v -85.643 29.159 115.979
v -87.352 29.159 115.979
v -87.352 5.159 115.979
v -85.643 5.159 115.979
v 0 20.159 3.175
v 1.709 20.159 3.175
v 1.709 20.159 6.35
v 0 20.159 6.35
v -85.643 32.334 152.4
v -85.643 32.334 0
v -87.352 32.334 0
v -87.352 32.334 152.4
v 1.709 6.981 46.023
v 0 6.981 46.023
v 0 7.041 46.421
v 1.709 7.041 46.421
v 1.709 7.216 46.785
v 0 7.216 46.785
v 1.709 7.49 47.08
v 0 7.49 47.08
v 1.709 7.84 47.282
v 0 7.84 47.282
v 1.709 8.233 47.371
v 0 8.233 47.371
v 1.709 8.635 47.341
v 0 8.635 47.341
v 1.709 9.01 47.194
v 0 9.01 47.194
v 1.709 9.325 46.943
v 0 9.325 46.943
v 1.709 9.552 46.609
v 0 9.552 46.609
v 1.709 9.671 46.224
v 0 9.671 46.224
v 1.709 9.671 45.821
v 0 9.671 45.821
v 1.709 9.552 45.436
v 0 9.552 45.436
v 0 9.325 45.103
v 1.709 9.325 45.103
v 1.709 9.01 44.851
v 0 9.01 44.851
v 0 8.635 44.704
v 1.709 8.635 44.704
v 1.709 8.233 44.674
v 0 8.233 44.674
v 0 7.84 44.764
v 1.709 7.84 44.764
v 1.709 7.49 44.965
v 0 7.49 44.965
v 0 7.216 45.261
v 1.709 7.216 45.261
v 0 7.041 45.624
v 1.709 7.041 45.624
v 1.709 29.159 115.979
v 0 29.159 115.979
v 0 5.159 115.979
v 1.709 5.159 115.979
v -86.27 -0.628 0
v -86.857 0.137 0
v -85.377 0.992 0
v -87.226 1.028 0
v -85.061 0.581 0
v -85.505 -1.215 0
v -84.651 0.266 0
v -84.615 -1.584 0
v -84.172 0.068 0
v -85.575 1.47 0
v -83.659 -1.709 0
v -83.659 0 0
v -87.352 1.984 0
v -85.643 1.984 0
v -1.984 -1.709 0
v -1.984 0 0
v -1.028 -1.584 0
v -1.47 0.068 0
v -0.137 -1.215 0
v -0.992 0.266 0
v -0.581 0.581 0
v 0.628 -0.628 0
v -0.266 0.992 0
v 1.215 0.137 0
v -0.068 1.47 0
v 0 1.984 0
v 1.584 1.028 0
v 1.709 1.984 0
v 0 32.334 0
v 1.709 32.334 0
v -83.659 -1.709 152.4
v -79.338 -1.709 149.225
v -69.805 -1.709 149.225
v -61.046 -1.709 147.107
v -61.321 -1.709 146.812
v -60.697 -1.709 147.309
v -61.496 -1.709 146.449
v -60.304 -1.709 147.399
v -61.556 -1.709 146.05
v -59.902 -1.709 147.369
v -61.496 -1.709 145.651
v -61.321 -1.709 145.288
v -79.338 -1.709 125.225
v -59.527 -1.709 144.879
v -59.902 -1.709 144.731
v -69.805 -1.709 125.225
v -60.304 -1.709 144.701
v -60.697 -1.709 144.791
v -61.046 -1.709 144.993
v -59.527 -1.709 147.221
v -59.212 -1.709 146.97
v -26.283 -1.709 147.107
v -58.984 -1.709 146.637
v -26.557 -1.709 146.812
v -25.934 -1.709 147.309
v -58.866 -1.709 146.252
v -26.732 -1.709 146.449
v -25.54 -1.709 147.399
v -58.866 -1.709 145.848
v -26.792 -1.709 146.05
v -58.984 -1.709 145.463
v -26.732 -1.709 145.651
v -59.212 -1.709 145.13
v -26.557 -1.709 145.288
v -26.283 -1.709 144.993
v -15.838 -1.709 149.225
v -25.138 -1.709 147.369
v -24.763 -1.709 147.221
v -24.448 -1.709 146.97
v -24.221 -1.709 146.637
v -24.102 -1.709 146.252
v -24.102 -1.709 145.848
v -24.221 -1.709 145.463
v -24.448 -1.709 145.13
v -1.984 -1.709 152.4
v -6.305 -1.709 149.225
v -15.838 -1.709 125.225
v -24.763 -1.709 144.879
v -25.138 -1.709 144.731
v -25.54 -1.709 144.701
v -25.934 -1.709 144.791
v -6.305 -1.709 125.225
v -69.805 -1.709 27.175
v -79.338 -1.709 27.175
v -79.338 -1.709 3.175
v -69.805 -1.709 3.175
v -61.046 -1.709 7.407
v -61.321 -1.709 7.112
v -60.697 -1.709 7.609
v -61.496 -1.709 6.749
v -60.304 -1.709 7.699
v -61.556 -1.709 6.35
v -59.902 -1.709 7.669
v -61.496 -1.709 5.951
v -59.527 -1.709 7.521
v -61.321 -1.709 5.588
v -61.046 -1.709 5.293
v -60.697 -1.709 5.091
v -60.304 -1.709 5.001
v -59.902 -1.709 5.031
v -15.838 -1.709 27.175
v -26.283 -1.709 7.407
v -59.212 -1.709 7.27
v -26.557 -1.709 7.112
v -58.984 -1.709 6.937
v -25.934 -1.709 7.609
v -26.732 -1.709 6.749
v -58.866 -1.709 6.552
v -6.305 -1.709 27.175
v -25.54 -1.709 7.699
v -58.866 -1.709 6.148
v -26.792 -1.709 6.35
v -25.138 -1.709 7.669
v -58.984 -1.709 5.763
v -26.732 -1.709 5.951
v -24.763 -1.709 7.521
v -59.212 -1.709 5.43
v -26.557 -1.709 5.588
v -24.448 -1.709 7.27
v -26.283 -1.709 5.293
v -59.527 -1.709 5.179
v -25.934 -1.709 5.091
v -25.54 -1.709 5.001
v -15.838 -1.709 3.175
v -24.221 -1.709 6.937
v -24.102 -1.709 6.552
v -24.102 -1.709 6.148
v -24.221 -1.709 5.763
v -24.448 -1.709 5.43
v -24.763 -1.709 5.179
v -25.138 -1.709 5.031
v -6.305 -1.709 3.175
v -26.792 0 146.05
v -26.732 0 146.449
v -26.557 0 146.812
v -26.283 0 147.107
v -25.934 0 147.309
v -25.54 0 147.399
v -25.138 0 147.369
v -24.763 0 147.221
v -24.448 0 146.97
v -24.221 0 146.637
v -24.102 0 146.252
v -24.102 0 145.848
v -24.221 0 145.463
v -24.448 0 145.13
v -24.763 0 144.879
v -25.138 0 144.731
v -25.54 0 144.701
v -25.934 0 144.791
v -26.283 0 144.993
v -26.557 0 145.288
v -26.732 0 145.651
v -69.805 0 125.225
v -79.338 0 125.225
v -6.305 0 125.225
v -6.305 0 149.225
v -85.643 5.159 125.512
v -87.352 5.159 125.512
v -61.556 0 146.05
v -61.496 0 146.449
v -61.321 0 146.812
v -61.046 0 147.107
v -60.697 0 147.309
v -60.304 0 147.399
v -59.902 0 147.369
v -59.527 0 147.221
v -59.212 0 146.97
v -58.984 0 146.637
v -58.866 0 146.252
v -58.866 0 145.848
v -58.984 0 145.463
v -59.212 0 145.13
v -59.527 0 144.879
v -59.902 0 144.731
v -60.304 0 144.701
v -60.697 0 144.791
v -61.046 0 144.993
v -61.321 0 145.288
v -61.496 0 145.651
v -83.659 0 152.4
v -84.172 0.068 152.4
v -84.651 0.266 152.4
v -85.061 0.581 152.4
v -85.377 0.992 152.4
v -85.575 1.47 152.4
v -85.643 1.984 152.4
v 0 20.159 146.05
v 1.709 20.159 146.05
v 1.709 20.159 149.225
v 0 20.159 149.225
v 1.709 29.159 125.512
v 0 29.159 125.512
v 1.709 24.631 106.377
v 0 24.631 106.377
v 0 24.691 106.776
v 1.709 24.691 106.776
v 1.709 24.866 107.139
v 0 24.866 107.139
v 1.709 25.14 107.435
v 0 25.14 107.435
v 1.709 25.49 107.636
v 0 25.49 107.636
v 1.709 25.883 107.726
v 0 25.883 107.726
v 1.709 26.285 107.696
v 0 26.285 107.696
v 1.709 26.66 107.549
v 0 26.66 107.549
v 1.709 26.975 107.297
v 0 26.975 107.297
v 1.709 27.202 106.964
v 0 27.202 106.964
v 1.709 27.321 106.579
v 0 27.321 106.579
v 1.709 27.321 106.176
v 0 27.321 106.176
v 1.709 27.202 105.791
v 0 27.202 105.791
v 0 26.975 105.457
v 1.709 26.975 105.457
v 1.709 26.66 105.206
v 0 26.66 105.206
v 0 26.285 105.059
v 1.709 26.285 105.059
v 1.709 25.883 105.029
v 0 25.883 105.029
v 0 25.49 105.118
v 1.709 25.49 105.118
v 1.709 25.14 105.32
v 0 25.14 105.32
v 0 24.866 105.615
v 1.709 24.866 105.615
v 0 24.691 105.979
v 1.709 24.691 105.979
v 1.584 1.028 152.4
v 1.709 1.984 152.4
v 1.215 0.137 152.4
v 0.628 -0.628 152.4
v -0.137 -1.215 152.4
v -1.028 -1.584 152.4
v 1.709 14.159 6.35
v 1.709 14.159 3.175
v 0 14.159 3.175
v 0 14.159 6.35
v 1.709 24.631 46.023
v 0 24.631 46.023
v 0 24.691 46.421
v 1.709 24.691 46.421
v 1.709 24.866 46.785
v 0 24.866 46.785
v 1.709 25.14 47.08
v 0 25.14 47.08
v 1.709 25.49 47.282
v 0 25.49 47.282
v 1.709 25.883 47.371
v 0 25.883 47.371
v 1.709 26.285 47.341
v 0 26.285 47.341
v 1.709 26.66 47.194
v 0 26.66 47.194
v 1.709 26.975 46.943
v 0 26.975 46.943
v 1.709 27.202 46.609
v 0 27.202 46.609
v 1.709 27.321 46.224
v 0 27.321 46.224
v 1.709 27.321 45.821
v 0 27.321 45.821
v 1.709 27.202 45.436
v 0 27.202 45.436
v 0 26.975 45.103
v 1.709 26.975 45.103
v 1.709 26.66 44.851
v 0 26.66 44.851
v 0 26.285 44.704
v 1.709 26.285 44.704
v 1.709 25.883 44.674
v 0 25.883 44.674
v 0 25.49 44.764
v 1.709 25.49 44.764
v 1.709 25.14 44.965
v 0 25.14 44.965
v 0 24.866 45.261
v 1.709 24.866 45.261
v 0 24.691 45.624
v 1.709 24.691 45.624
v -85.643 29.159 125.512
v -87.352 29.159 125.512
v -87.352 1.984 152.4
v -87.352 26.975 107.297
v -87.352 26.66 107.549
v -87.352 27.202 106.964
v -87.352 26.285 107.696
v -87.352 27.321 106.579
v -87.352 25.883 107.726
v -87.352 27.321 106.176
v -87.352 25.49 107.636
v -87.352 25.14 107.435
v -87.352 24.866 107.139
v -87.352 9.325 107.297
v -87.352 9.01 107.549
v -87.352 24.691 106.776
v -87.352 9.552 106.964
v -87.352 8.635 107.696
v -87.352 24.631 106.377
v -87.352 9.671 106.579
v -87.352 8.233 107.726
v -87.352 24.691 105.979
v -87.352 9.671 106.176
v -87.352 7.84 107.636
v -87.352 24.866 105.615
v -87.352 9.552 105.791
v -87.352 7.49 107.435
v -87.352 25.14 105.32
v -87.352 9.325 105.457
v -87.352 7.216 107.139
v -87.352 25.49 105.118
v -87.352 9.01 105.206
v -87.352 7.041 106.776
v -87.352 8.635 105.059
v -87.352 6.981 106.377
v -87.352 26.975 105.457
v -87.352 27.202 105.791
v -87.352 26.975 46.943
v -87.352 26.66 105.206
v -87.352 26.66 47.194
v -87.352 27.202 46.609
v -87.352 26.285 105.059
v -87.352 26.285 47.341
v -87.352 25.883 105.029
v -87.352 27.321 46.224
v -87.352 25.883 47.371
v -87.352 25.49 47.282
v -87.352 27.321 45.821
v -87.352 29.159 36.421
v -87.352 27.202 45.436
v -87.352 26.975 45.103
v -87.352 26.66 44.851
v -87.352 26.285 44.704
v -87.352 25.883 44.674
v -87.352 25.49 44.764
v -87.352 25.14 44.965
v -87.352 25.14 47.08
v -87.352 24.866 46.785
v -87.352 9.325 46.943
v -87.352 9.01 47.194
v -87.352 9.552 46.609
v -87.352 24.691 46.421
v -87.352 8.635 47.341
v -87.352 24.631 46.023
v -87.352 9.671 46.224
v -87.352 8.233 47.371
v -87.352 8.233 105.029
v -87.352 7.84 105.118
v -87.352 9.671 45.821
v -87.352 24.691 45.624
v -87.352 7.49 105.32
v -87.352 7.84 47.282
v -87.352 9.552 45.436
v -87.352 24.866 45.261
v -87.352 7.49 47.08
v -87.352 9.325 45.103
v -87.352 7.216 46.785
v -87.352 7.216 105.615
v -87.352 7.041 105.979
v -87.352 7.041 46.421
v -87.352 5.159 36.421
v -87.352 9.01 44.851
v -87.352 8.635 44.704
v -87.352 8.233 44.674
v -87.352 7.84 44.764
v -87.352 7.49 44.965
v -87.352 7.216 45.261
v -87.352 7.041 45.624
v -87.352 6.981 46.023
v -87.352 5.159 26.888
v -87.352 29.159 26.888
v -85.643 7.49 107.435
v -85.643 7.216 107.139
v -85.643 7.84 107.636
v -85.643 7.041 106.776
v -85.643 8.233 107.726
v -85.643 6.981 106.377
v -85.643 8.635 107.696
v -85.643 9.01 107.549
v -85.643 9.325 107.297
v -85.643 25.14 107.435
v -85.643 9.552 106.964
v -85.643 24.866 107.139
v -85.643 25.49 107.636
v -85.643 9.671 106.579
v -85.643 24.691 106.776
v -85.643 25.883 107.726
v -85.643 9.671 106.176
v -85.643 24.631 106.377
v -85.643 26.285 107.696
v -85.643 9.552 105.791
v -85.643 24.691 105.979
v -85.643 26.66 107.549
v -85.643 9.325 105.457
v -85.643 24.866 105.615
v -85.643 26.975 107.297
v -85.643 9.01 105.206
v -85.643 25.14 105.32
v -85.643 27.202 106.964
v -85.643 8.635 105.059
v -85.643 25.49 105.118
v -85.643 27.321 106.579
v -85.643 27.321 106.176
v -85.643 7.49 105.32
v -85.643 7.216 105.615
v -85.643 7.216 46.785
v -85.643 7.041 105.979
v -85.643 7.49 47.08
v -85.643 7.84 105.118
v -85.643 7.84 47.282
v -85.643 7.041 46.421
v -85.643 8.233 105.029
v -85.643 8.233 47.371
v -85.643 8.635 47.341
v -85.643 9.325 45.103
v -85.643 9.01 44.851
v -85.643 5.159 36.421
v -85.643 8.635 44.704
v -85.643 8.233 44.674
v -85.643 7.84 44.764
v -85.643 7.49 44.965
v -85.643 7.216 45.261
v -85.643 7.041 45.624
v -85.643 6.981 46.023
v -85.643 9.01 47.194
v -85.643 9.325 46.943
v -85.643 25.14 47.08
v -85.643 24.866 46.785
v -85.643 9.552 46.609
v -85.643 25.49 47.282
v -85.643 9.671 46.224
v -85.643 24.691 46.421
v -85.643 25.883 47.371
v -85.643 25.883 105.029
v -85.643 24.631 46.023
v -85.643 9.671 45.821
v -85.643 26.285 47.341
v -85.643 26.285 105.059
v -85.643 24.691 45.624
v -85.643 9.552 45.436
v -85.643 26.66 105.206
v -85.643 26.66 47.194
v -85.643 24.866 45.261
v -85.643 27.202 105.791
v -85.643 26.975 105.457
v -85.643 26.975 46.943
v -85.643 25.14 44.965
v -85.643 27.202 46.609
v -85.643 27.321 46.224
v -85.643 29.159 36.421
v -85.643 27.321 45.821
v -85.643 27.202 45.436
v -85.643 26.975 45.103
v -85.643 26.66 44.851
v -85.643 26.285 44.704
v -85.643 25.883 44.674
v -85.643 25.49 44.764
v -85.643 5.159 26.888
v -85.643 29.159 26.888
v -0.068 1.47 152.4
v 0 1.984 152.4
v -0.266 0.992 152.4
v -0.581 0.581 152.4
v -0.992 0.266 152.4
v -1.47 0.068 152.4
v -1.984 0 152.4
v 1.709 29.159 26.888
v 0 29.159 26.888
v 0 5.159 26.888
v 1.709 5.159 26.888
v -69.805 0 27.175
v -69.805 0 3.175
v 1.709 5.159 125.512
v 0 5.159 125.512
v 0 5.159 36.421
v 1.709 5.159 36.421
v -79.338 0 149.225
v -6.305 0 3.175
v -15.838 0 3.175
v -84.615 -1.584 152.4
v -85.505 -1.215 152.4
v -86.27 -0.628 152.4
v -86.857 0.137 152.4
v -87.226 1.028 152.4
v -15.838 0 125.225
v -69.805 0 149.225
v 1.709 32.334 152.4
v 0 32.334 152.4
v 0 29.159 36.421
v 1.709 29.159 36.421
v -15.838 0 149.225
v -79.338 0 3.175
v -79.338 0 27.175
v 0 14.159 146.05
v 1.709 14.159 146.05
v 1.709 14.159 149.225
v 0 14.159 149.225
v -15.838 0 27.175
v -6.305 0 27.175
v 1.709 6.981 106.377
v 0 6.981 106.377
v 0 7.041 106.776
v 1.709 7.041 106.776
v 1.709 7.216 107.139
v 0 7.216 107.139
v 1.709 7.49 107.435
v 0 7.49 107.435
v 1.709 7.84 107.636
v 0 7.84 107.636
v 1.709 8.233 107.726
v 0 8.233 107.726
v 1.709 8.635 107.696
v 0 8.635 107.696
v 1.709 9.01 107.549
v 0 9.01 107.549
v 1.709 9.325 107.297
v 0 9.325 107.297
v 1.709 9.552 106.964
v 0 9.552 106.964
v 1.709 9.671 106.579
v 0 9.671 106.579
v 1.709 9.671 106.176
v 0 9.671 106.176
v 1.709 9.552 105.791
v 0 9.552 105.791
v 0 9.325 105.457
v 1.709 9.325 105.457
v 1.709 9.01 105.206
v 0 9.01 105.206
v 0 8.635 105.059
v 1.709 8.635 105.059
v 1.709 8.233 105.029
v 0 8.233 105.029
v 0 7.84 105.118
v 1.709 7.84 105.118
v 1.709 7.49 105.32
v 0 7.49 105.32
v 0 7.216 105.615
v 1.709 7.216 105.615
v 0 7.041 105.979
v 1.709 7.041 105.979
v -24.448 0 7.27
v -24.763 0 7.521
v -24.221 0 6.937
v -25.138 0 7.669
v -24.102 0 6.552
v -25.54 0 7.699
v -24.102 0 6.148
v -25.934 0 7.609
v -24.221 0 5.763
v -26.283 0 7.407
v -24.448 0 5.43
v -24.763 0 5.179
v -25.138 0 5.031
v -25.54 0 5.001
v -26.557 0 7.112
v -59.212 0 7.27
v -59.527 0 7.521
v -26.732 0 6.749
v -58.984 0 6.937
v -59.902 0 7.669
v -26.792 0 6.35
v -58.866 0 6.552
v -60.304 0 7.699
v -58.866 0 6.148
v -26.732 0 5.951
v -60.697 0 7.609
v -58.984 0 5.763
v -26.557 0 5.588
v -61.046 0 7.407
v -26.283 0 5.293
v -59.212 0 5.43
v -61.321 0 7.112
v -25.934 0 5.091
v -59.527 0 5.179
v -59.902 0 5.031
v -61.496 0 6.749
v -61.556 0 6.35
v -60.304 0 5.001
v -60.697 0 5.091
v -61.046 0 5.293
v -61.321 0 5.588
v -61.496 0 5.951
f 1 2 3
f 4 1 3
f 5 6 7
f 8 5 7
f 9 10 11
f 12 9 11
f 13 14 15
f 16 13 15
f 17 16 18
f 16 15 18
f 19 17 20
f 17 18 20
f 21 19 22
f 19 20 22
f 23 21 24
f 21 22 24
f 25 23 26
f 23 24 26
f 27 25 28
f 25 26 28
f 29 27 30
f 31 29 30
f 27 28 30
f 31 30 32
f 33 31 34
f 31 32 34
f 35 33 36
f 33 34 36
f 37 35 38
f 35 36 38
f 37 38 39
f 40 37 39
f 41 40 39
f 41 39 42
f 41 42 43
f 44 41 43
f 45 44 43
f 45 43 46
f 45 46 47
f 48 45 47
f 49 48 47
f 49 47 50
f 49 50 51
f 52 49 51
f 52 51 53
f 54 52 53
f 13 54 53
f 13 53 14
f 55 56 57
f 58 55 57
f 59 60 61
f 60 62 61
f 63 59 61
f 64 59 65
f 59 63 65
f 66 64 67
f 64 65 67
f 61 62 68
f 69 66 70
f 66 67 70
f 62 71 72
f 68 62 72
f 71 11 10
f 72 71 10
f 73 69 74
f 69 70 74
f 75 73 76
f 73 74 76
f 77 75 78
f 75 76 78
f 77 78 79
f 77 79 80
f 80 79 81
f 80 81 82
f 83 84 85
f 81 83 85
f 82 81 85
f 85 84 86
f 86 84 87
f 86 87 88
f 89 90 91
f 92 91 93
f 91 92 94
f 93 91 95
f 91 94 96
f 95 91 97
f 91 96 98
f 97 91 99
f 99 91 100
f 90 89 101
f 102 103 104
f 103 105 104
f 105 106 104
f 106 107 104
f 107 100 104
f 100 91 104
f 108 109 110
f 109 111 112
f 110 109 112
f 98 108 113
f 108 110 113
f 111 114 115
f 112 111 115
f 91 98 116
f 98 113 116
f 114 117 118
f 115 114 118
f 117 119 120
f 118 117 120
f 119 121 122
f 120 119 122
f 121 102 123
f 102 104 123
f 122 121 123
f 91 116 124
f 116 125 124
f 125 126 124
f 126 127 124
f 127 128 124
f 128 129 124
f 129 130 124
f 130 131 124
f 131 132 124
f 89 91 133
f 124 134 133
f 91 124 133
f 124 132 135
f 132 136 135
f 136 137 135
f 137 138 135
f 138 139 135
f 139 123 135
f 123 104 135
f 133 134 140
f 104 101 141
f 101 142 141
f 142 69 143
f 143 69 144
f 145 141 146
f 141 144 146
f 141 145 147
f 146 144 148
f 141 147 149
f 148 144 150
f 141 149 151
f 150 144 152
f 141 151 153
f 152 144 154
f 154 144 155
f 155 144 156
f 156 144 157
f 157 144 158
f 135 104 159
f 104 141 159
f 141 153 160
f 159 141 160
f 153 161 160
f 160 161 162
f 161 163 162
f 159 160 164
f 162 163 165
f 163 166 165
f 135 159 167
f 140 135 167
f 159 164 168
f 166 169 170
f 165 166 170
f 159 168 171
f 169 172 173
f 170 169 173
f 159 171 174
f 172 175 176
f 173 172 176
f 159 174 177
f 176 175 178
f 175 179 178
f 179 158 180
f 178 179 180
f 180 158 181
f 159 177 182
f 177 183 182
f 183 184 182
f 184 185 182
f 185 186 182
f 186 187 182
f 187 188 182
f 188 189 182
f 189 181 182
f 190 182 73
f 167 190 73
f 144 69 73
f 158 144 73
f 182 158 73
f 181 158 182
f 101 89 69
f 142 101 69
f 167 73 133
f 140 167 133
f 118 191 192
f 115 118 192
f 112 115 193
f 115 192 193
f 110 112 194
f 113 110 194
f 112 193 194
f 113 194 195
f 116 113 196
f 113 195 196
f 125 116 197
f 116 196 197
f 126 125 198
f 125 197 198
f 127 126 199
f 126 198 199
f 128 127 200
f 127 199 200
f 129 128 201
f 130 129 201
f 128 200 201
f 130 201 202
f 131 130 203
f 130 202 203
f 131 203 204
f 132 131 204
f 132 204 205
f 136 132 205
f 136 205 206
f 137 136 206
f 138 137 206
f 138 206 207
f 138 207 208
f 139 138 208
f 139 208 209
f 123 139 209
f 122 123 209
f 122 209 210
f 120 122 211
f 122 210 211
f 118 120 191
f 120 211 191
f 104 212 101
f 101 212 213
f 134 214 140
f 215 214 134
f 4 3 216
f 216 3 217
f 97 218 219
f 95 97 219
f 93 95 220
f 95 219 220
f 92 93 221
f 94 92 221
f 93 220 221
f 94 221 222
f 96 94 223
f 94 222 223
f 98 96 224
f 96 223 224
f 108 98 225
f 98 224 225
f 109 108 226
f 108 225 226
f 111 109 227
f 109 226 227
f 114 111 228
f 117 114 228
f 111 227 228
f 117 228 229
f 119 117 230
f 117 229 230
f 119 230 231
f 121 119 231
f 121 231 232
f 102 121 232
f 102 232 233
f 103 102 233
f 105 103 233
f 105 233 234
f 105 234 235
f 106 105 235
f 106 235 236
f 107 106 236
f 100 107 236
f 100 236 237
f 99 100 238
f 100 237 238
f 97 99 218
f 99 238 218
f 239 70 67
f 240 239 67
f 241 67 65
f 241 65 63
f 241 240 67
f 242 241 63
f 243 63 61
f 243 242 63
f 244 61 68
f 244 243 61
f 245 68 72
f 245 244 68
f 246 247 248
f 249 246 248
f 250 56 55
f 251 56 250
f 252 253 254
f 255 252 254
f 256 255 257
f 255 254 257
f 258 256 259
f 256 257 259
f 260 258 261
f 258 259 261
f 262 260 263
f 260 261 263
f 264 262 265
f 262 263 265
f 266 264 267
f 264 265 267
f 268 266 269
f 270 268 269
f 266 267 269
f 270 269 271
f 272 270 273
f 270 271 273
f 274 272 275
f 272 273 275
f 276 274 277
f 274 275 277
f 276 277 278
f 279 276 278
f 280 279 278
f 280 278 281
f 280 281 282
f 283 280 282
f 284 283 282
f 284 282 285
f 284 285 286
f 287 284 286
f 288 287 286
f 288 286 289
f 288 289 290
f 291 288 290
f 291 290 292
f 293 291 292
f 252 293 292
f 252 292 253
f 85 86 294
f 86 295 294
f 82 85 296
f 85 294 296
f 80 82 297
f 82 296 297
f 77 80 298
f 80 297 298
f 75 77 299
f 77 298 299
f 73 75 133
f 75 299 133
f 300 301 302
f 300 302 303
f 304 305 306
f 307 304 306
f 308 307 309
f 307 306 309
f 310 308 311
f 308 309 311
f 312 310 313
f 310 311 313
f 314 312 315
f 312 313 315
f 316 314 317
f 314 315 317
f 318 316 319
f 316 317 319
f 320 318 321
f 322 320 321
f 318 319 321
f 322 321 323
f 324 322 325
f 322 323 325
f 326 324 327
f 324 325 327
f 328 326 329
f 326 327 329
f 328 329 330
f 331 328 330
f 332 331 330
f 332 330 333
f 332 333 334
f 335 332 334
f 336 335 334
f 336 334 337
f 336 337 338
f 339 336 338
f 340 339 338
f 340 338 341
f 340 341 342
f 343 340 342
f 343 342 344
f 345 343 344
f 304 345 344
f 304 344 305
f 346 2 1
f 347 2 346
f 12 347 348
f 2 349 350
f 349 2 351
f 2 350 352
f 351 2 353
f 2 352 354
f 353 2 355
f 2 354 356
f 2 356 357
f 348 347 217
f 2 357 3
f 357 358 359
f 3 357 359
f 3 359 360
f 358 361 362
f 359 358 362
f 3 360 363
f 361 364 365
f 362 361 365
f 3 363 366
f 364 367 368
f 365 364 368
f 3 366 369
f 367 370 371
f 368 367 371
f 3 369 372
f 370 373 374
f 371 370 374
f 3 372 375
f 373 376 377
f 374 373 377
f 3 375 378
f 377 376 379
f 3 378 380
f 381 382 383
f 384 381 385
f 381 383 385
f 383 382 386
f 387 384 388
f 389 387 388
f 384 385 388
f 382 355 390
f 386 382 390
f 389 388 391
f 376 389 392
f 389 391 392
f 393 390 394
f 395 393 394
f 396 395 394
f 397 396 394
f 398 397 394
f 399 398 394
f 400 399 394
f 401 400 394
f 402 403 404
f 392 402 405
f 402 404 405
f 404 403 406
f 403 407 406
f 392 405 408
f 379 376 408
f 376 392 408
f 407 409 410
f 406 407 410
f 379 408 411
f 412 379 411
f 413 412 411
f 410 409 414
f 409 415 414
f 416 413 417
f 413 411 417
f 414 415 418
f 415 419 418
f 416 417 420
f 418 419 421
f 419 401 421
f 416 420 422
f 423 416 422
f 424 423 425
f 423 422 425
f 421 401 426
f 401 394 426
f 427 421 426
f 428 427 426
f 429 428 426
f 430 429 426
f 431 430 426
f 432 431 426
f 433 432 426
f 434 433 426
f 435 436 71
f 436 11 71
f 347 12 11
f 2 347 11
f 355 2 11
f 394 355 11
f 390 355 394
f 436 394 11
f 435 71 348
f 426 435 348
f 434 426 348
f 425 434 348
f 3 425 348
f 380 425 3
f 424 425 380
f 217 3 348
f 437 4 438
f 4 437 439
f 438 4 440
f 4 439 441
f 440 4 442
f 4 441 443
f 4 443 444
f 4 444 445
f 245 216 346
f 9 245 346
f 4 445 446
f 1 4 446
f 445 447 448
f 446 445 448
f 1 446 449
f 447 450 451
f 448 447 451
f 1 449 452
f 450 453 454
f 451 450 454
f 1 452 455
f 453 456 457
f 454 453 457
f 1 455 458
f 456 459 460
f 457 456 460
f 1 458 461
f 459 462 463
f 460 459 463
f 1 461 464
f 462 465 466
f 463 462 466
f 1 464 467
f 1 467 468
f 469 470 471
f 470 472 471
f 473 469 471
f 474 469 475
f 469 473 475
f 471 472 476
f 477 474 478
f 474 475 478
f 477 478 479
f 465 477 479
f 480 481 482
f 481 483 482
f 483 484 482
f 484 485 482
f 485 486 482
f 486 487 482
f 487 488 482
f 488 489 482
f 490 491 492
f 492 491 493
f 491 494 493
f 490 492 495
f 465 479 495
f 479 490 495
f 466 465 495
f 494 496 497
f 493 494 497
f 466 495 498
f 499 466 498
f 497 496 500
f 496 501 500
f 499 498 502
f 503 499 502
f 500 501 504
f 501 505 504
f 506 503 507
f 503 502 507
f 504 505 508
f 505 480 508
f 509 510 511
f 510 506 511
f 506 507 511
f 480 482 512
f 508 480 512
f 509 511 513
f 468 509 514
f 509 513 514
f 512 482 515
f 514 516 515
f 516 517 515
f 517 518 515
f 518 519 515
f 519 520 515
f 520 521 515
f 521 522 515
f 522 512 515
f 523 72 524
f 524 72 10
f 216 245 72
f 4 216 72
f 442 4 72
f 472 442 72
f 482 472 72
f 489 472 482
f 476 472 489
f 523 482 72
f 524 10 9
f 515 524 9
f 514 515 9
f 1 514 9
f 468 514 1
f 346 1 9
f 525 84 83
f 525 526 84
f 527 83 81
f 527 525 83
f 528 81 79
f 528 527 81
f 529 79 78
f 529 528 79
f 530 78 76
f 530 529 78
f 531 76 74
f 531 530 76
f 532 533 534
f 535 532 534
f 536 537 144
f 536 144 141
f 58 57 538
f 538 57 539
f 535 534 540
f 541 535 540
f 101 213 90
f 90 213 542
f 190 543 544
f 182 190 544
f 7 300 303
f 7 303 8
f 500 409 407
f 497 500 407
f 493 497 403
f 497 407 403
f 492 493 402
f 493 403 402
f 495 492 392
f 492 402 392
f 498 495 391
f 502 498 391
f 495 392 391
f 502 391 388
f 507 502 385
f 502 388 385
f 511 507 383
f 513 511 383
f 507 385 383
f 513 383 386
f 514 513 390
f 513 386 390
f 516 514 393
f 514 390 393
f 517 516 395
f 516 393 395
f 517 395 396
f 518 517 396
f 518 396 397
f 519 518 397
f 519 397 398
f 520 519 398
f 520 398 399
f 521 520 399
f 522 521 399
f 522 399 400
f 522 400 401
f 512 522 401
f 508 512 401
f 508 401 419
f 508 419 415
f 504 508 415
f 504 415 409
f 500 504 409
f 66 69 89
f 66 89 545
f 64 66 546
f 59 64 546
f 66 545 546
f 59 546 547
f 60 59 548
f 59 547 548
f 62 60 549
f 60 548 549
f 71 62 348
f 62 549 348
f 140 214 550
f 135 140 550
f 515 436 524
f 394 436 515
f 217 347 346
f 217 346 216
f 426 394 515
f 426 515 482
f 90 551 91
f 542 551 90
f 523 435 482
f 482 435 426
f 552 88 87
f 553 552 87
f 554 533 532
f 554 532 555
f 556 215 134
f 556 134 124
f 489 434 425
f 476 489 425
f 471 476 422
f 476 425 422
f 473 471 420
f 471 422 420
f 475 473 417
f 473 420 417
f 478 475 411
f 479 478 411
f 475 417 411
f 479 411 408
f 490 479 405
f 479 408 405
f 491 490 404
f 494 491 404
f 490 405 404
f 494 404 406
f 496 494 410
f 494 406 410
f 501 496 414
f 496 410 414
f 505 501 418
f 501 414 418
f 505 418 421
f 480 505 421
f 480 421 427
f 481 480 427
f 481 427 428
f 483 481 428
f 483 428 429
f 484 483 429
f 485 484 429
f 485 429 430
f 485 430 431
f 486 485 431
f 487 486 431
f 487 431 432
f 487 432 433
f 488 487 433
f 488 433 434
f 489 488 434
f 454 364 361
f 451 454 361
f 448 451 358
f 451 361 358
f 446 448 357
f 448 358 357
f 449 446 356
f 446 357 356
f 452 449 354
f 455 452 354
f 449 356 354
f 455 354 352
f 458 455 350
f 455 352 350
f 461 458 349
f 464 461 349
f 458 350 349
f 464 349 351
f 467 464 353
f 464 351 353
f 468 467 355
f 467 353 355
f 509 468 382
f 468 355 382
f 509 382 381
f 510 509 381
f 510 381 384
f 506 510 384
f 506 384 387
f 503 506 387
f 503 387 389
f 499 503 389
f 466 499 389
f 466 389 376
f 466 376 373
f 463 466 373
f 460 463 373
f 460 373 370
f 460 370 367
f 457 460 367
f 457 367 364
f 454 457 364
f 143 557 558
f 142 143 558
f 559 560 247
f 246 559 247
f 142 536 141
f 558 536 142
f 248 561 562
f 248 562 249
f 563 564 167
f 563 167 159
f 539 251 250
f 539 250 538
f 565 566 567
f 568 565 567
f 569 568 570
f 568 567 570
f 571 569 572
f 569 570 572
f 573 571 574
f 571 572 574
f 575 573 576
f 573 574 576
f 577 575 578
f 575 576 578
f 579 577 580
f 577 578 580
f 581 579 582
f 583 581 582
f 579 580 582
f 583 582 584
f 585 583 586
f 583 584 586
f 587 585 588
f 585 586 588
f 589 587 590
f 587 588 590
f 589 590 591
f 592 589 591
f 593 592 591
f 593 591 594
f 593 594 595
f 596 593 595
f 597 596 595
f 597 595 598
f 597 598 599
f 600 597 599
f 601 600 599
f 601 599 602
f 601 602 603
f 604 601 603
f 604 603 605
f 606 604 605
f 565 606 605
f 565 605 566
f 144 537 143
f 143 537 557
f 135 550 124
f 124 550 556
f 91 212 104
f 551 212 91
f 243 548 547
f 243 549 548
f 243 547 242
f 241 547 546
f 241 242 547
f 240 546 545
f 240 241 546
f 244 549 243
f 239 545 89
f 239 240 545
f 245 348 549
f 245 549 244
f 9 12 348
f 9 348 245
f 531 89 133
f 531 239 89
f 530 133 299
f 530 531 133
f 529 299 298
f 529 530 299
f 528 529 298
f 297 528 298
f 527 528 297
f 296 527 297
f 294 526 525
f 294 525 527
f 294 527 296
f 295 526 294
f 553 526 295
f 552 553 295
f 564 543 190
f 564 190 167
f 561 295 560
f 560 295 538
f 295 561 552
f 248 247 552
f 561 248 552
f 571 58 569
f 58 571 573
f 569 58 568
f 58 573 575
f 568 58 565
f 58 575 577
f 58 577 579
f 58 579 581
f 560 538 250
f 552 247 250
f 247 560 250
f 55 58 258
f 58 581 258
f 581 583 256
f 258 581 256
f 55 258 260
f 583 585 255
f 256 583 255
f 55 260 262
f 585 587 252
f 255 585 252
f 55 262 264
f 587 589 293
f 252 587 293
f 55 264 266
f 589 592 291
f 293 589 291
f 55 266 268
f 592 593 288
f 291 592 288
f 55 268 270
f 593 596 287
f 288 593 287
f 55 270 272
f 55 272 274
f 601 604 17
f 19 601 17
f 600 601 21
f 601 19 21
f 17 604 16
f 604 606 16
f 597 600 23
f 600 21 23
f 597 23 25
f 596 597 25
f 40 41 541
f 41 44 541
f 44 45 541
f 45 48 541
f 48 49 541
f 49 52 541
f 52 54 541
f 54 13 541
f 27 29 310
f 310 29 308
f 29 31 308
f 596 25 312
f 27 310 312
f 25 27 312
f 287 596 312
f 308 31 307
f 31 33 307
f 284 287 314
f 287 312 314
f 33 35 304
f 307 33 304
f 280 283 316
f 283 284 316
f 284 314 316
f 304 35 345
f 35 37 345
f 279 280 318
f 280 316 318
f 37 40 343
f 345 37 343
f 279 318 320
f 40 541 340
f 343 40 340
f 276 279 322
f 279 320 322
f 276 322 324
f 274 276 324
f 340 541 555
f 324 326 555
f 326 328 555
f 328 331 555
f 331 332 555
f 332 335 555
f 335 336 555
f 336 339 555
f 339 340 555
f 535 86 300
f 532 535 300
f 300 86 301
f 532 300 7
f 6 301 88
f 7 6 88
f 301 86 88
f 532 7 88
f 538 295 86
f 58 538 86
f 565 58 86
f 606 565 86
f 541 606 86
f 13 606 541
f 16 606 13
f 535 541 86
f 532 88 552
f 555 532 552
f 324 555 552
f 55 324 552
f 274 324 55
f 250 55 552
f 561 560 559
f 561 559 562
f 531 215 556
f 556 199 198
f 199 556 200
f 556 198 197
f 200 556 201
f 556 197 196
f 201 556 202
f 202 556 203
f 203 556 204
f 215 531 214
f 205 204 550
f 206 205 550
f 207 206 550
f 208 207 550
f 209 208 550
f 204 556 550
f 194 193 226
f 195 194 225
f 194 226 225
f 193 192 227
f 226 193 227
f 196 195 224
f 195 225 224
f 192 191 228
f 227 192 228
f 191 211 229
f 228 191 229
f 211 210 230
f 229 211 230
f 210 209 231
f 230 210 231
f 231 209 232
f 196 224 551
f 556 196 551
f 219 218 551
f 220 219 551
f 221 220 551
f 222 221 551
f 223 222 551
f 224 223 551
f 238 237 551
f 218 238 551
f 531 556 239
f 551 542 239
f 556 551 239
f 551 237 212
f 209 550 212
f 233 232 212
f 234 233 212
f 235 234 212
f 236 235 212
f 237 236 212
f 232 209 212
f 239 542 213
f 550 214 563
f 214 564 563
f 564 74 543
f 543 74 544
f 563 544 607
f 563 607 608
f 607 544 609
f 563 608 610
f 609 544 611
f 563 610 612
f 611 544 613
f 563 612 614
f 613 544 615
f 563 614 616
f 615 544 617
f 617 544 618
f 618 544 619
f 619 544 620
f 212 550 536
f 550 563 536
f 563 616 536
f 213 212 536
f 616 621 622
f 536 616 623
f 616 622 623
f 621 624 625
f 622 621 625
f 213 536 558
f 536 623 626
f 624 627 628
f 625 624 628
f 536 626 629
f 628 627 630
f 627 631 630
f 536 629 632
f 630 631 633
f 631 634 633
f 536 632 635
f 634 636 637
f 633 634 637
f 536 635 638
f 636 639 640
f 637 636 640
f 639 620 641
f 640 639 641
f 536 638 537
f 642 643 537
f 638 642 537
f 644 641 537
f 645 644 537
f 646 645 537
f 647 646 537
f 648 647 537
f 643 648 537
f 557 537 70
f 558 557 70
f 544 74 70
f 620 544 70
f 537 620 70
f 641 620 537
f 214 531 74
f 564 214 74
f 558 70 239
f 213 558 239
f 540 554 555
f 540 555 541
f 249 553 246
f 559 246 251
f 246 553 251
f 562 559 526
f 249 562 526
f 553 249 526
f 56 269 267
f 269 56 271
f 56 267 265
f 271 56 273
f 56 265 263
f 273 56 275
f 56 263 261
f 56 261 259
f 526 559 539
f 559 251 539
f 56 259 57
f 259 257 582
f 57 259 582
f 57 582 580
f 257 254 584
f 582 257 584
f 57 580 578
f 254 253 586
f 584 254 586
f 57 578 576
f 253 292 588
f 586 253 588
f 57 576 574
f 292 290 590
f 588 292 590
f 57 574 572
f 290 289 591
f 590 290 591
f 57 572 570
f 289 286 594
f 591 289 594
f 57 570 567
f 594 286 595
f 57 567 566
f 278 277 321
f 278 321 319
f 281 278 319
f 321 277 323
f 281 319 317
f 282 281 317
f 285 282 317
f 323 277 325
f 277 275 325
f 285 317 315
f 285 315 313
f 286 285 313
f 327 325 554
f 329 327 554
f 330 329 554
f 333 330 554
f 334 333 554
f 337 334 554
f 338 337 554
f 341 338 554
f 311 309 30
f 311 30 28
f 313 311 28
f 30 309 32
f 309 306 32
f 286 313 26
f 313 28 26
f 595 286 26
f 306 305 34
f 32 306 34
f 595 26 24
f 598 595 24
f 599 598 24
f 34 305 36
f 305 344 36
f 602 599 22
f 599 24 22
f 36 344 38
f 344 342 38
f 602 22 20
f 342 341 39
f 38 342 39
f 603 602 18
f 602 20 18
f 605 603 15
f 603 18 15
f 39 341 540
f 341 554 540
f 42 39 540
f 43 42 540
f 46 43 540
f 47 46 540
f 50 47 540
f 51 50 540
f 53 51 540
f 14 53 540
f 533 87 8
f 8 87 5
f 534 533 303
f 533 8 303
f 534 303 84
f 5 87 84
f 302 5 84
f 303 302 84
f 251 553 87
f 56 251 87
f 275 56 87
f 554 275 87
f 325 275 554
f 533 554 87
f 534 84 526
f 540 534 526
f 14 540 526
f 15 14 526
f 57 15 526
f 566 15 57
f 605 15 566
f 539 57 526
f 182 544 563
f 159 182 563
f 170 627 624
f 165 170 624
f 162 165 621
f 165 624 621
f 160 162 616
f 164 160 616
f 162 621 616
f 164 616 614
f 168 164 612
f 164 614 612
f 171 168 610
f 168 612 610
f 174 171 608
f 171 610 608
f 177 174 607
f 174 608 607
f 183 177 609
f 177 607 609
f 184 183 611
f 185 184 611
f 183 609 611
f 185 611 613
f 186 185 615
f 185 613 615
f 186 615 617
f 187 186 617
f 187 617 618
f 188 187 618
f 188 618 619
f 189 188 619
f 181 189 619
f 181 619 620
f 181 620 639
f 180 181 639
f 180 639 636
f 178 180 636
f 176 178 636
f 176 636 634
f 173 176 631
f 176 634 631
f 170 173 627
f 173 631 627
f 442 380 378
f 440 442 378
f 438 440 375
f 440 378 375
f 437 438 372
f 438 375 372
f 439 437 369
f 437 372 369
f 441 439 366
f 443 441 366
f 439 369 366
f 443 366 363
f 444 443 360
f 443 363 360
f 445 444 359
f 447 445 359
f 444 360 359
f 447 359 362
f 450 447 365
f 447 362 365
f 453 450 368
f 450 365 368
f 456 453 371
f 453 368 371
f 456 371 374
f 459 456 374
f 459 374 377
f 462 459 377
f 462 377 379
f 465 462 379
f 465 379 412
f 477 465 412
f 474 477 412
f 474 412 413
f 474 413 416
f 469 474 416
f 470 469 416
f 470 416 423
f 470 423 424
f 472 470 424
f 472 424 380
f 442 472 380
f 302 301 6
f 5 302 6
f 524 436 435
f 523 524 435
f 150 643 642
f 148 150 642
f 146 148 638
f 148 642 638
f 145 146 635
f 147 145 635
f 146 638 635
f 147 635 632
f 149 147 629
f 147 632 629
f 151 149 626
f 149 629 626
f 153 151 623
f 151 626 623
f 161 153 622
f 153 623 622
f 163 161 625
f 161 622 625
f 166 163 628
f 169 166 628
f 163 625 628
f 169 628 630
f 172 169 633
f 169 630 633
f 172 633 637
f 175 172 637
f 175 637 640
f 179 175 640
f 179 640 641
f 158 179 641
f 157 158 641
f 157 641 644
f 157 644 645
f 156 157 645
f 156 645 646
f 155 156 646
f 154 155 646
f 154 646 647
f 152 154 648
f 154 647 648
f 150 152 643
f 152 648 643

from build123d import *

# Parameters (mm, degrees)
F1_DEPTH = 152.4
F2_R     = 1.98374
F3_R     = 3.69316
F4_W     = 9.5329248
F4_H     = 24
F4_R     = 1.35255
F5_DEPTH = 1.70942
F6_W     = 24
F6_H     = 9.5329248
F6_R     = 1.35255
F7_DEPTH = 89.0613408
F8_W     = 6
F8_H     = 3.175
F9_DEPTH = 1.70942


with BuildPart() as f1:
    # F0 (on Top) → F1 (new body)
    with BuildSketch(Plane.XY):
        Polygon((0, 32.3337428), (0, 0), (-85.6425008, 0), (-85.6425008, 32.3337428), (-87.3519208, 32.3337428), (-87.3519208, -1.70942), (1.70942, -1.70942), (1.70942, 32.3337428), align=None)
    extrude(amount=F1_DEPTH)

    # F2
    f2_edges = [f1.edges().sort_by_distance(p)[0] for p in [
        (0, 0, 76.2),
        (-85.642501, 0, 76.2),
    ]]
    fillet(f2_edges, radius=F2_R)

    # F3
    f3_edges = [f1.edges().sort_by_distance(p)[0] for p in [
        (1.70942, -1.70942, 76.2),
        (-87.351921, -1.70942, 76.2),
    ]]
    fillet(f3_edges, radius=F3_R)

    # F4 (on face) → F5 (cut, through all)
    with BuildSketch(Plane(origin=(0, 0, 0), x_dir=(-1, 0, 0), z_dir=(0, 1, 0))):
        with Locations((74.5712504, 15.175)):
            Rectangle(F4_W, F4_H)
        with Locations((11.0712504, 15.175)):
            Rectangle(F4_W, F4_H)
        with Locations((11.0712504, 137.225)):
            Rectangle(F4_W, F4_H)
        with Locations((74.5712504, 137.225)):
            Rectangle(F4_W, F4_H)
        with Locations((60.20308, 6.35)):
            Circle(F4_R)
        with Locations((25.4394208, 6.35)):
            Circle(F4_R)
        with Locations((25.4394208, 146.05)):
            Circle(F4_R)
        with Locations((60.20308, 146.05)):
            Circle(F4_R)
    extrude(amount=-F5_DEPTH, mode=Mode.SUBTRACT)

    # F6 (on face) → F7 (cut, through all)
    with BuildSketch(Plane(origin=(-87.3519208, 0, 0), x_dir=(0, -1, 0), z_dir=(-1, 0, 0))):
        with Locations((-17.15874, 31.6544706)):
            Rectangle(F6_W, F6_H)
        with Locations((-17.15874, 120.7455294)):
            Rectangle(F6_W, F6_H)
        with Locations((-25.98374, 46.022641)):
            Circle(F6_R)
        with Locations((-25.98374, 106.377359)):
            Circle(F6_R)
        with Locations((-8.33374, 106.377359)):
            Circle(F6_R)
        with Locations((-8.33374, 46.022641)):
            Circle(F6_R)
    extrude(amount=-F7_DEPTH, mode=Mode.SUBTRACT)

    # F8 (on face) → F9 (cut, through all)
    with BuildSketch(Plane.YZ.offset(1.70942)):
        with Locations((17.1587414, 4.7625)):
            Rectangle(F8_W, F8_H)
        with Locations((17.1587414, 147.6375)):
            Rectangle(F8_W, F8_H)
    extrude(amount=-F9_DEPTH, mode=Mode.SUBTRACT)


solid = f1.part
